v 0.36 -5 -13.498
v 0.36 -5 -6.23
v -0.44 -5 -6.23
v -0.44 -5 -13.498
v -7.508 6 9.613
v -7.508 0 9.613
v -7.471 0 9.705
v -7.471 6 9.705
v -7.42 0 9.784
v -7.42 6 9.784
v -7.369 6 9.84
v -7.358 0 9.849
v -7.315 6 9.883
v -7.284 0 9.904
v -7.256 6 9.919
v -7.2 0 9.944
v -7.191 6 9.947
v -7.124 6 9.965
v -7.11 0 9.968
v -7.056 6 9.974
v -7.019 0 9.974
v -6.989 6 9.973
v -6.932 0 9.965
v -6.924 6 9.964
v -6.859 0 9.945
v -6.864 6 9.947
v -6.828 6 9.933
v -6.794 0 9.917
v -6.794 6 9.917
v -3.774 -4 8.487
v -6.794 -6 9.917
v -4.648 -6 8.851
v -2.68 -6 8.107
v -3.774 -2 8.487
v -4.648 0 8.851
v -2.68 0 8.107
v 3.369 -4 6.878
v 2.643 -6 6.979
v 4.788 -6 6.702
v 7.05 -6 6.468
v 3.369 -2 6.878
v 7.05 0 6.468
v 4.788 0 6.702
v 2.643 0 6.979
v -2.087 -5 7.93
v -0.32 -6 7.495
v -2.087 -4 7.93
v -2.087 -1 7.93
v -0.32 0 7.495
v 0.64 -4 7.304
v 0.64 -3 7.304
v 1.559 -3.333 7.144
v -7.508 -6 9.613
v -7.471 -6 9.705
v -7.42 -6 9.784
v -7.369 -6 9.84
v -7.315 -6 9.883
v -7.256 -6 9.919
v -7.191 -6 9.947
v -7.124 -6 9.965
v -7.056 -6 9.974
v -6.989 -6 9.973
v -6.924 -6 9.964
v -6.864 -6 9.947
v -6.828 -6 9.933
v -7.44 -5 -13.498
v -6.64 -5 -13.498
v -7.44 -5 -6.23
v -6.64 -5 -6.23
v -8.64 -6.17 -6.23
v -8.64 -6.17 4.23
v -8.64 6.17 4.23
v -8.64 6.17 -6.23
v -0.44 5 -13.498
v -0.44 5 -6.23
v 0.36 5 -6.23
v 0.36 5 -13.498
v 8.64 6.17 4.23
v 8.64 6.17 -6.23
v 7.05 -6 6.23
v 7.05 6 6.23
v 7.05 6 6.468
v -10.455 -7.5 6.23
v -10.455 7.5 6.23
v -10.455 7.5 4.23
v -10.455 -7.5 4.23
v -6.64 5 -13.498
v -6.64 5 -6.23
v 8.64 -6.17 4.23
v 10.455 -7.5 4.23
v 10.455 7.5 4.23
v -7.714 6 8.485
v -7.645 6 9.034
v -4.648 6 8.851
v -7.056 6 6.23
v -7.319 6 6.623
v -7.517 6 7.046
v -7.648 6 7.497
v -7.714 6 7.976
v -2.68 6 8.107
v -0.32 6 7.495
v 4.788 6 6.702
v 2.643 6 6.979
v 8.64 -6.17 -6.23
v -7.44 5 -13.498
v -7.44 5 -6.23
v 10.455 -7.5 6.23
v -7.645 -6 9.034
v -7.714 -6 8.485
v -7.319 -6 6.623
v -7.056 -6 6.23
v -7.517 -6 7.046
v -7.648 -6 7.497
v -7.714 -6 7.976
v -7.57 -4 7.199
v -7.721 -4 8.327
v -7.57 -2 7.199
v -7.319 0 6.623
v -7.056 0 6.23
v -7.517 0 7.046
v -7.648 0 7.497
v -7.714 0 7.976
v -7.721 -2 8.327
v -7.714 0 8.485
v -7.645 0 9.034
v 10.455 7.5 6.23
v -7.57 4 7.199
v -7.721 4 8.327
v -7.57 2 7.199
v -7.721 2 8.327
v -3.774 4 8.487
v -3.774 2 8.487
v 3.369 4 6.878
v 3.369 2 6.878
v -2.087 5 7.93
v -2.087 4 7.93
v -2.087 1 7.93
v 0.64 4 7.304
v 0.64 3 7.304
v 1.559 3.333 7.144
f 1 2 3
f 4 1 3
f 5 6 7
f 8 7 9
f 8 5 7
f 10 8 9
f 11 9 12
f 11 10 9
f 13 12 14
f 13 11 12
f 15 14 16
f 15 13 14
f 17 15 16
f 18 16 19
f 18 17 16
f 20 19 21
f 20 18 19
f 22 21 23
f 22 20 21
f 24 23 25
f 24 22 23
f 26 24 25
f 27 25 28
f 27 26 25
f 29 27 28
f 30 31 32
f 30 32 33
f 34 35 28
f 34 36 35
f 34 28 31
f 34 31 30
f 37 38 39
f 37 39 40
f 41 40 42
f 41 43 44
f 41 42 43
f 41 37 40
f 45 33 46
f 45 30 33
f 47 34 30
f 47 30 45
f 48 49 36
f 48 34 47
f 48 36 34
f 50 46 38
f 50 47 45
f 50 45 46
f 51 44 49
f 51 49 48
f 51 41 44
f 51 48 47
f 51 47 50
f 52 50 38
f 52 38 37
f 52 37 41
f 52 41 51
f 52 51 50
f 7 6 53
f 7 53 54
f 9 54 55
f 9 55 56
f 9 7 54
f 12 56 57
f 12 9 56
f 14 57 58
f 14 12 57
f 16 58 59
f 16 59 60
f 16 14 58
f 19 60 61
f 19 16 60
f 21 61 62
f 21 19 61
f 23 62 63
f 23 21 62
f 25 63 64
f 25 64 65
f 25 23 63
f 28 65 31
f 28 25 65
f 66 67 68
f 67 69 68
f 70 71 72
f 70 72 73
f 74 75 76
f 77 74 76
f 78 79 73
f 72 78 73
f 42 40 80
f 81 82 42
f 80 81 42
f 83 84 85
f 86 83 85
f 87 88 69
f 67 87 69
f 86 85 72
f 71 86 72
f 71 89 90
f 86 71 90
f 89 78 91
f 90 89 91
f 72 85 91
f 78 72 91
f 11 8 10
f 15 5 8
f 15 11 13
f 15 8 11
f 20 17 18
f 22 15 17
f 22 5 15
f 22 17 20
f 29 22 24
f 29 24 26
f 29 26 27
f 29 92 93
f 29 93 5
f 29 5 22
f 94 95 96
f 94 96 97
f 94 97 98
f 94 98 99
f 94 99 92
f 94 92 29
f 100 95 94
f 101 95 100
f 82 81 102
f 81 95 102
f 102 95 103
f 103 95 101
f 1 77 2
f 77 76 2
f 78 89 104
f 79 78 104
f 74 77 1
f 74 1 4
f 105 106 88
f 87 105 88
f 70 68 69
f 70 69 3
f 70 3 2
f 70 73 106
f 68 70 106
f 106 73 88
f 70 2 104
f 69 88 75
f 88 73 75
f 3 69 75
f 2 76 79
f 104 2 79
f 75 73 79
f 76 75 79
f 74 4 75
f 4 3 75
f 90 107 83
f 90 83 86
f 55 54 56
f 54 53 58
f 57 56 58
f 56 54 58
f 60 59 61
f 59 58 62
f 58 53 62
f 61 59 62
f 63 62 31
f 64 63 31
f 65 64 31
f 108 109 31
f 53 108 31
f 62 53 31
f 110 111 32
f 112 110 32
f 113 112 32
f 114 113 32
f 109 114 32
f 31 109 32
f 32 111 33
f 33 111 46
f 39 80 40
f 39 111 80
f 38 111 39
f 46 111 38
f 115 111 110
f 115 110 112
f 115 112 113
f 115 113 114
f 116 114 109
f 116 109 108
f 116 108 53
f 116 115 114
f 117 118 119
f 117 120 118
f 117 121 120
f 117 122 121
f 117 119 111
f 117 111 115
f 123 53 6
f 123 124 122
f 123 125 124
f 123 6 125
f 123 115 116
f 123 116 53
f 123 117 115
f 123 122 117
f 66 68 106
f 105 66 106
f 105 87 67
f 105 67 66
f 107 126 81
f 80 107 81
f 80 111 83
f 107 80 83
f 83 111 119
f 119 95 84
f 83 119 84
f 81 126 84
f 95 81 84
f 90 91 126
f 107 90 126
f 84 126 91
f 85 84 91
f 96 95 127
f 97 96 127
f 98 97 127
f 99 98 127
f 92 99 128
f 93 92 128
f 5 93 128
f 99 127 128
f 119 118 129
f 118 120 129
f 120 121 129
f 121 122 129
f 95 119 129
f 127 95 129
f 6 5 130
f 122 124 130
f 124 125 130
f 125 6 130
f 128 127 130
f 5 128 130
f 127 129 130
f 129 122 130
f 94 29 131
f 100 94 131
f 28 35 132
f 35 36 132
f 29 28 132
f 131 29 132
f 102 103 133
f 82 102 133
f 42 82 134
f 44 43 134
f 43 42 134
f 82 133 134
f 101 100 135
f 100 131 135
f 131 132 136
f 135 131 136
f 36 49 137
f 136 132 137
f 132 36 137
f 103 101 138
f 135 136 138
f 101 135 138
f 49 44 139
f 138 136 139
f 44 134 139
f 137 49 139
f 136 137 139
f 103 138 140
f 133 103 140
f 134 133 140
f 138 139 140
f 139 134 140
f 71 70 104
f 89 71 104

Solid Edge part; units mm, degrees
sketch "Sketch1" plane through (0, 0, 0) normal (0, -1, 0) x (1, 0, 0)
  line L0 (-8.64, -6.23) -> (8.64, -6.23)
  line L1 (8.64, 4.23) -> (8.64, -6.23)
  line L2 (8.64, 4.23) -> (10.455, 4.23)
  line L3 (10.455, 4.23) -> (10.455, 6.23)
  line L4 (10.455, 6.23) -> (-10.455, 6.23)
  line L5 (-10.455, 6.23) -> (-10.455, 4.23)
  line L6 (-10.455, 4.23) -> (-8.64, 4.23)
  line L7 (-8.64, 4.23) -> (-8.64, -6.23)
  dimension "D1" = 2
  dimension "D2" = 17.28
extrude "Protrusion1" add sketch "Sketch1" along normal mid plane 15
sketch "Sketch2" plane through (0, 0, -6.23) normal (0, 0, -1) x (0, 1, 0)
  line L0 (-6.17, -8.64) -> (-7.5, -8.64)
  line L1 (-7.5, -8.64) -> (-7.5, 8.64)
  line L2 (-7.5, 8.64) -> (-6.17, 8.64)
  line L3 (-6.17, -8.64) -> (-6.17, 8.64)
  line L4 (6.17, 8.64) -> (7.5, 8.64)
  line L5 (7.5, 8.64) -> (7.5, -8.64)
  line L6 (7.5, -8.64) -> (6.17, -8.64)
  line L7 (6.17, 8.64) -> (6.17, -8.64)
extrude "Cutout1" cut sketch "Sketch2" against normal up to surface (10.46 mm away)
sketch "Sketch3" plane through (0, 0, -6.23) normal (0, 0, -1) x (1, 0, 0)
  line L0 (-7.44, -5) -> (-6.64, -5)
  line L1 (-6.64, -5) -> (-6.64, 5)
  line L2 (-6.64, 5) -> (-7.44, 5)
  line L3 (-7.44, 5) -> (-7.44, -5)
  line L4 (-0.44, -5) -> (0.36, -5)
  line L5 (0.36, -5) -> (0.36, 5)
  line L6 (0.36, 5) -> (-0.44, 5)
  line L7 (-0.44, 5) -> (-0.44, -5)
  dimension "D1" = 2
  dimension "D2" = 0.8
  dimension "D3" = 0.8
  dimension "D4" = 9
extrude "ExtrudedProtrusion_2" add sketch "Sketch3" along normal blind 7.2684 and the other way blind 4.6435
sketch "Sketch4" plane through (0, 0, 0) normal (0, -1, 0) x (1, 0, 0)
  spline S0 degree 3 poles (-7.0557, 6.23) (-7.8479, 7.243) (-7.9337, 8.5637) (-7.3131, 10.1922) knots 0 0 0 0 1 1 1 1
  spline S1 degree 3 poles (-7.3131, 10.1922) (-6.0411, 9.5159) (-2.945, 7.8753) (2.3147, 6.9676) (5.6977, 6.5935) (7.05, 6.4683) knots 0 0 0 0 0.262711 0.752323 1 1 1 1
  line L0 (7.05, 6.4683) -> (7.05, 6.23)
  line L1 (7.05, 6.23) -> (-7.037, 6.23)
  line L2 (-7.0557, 6.23) -> (-7.037, 6.23)
extrude "ExtrudedProtrusion_3" add sketch "Sketch4" along normal mid plane 12
fillet "Round_1" radius 0.5 1 edges at (-7.3131, 0, 10.1922)
